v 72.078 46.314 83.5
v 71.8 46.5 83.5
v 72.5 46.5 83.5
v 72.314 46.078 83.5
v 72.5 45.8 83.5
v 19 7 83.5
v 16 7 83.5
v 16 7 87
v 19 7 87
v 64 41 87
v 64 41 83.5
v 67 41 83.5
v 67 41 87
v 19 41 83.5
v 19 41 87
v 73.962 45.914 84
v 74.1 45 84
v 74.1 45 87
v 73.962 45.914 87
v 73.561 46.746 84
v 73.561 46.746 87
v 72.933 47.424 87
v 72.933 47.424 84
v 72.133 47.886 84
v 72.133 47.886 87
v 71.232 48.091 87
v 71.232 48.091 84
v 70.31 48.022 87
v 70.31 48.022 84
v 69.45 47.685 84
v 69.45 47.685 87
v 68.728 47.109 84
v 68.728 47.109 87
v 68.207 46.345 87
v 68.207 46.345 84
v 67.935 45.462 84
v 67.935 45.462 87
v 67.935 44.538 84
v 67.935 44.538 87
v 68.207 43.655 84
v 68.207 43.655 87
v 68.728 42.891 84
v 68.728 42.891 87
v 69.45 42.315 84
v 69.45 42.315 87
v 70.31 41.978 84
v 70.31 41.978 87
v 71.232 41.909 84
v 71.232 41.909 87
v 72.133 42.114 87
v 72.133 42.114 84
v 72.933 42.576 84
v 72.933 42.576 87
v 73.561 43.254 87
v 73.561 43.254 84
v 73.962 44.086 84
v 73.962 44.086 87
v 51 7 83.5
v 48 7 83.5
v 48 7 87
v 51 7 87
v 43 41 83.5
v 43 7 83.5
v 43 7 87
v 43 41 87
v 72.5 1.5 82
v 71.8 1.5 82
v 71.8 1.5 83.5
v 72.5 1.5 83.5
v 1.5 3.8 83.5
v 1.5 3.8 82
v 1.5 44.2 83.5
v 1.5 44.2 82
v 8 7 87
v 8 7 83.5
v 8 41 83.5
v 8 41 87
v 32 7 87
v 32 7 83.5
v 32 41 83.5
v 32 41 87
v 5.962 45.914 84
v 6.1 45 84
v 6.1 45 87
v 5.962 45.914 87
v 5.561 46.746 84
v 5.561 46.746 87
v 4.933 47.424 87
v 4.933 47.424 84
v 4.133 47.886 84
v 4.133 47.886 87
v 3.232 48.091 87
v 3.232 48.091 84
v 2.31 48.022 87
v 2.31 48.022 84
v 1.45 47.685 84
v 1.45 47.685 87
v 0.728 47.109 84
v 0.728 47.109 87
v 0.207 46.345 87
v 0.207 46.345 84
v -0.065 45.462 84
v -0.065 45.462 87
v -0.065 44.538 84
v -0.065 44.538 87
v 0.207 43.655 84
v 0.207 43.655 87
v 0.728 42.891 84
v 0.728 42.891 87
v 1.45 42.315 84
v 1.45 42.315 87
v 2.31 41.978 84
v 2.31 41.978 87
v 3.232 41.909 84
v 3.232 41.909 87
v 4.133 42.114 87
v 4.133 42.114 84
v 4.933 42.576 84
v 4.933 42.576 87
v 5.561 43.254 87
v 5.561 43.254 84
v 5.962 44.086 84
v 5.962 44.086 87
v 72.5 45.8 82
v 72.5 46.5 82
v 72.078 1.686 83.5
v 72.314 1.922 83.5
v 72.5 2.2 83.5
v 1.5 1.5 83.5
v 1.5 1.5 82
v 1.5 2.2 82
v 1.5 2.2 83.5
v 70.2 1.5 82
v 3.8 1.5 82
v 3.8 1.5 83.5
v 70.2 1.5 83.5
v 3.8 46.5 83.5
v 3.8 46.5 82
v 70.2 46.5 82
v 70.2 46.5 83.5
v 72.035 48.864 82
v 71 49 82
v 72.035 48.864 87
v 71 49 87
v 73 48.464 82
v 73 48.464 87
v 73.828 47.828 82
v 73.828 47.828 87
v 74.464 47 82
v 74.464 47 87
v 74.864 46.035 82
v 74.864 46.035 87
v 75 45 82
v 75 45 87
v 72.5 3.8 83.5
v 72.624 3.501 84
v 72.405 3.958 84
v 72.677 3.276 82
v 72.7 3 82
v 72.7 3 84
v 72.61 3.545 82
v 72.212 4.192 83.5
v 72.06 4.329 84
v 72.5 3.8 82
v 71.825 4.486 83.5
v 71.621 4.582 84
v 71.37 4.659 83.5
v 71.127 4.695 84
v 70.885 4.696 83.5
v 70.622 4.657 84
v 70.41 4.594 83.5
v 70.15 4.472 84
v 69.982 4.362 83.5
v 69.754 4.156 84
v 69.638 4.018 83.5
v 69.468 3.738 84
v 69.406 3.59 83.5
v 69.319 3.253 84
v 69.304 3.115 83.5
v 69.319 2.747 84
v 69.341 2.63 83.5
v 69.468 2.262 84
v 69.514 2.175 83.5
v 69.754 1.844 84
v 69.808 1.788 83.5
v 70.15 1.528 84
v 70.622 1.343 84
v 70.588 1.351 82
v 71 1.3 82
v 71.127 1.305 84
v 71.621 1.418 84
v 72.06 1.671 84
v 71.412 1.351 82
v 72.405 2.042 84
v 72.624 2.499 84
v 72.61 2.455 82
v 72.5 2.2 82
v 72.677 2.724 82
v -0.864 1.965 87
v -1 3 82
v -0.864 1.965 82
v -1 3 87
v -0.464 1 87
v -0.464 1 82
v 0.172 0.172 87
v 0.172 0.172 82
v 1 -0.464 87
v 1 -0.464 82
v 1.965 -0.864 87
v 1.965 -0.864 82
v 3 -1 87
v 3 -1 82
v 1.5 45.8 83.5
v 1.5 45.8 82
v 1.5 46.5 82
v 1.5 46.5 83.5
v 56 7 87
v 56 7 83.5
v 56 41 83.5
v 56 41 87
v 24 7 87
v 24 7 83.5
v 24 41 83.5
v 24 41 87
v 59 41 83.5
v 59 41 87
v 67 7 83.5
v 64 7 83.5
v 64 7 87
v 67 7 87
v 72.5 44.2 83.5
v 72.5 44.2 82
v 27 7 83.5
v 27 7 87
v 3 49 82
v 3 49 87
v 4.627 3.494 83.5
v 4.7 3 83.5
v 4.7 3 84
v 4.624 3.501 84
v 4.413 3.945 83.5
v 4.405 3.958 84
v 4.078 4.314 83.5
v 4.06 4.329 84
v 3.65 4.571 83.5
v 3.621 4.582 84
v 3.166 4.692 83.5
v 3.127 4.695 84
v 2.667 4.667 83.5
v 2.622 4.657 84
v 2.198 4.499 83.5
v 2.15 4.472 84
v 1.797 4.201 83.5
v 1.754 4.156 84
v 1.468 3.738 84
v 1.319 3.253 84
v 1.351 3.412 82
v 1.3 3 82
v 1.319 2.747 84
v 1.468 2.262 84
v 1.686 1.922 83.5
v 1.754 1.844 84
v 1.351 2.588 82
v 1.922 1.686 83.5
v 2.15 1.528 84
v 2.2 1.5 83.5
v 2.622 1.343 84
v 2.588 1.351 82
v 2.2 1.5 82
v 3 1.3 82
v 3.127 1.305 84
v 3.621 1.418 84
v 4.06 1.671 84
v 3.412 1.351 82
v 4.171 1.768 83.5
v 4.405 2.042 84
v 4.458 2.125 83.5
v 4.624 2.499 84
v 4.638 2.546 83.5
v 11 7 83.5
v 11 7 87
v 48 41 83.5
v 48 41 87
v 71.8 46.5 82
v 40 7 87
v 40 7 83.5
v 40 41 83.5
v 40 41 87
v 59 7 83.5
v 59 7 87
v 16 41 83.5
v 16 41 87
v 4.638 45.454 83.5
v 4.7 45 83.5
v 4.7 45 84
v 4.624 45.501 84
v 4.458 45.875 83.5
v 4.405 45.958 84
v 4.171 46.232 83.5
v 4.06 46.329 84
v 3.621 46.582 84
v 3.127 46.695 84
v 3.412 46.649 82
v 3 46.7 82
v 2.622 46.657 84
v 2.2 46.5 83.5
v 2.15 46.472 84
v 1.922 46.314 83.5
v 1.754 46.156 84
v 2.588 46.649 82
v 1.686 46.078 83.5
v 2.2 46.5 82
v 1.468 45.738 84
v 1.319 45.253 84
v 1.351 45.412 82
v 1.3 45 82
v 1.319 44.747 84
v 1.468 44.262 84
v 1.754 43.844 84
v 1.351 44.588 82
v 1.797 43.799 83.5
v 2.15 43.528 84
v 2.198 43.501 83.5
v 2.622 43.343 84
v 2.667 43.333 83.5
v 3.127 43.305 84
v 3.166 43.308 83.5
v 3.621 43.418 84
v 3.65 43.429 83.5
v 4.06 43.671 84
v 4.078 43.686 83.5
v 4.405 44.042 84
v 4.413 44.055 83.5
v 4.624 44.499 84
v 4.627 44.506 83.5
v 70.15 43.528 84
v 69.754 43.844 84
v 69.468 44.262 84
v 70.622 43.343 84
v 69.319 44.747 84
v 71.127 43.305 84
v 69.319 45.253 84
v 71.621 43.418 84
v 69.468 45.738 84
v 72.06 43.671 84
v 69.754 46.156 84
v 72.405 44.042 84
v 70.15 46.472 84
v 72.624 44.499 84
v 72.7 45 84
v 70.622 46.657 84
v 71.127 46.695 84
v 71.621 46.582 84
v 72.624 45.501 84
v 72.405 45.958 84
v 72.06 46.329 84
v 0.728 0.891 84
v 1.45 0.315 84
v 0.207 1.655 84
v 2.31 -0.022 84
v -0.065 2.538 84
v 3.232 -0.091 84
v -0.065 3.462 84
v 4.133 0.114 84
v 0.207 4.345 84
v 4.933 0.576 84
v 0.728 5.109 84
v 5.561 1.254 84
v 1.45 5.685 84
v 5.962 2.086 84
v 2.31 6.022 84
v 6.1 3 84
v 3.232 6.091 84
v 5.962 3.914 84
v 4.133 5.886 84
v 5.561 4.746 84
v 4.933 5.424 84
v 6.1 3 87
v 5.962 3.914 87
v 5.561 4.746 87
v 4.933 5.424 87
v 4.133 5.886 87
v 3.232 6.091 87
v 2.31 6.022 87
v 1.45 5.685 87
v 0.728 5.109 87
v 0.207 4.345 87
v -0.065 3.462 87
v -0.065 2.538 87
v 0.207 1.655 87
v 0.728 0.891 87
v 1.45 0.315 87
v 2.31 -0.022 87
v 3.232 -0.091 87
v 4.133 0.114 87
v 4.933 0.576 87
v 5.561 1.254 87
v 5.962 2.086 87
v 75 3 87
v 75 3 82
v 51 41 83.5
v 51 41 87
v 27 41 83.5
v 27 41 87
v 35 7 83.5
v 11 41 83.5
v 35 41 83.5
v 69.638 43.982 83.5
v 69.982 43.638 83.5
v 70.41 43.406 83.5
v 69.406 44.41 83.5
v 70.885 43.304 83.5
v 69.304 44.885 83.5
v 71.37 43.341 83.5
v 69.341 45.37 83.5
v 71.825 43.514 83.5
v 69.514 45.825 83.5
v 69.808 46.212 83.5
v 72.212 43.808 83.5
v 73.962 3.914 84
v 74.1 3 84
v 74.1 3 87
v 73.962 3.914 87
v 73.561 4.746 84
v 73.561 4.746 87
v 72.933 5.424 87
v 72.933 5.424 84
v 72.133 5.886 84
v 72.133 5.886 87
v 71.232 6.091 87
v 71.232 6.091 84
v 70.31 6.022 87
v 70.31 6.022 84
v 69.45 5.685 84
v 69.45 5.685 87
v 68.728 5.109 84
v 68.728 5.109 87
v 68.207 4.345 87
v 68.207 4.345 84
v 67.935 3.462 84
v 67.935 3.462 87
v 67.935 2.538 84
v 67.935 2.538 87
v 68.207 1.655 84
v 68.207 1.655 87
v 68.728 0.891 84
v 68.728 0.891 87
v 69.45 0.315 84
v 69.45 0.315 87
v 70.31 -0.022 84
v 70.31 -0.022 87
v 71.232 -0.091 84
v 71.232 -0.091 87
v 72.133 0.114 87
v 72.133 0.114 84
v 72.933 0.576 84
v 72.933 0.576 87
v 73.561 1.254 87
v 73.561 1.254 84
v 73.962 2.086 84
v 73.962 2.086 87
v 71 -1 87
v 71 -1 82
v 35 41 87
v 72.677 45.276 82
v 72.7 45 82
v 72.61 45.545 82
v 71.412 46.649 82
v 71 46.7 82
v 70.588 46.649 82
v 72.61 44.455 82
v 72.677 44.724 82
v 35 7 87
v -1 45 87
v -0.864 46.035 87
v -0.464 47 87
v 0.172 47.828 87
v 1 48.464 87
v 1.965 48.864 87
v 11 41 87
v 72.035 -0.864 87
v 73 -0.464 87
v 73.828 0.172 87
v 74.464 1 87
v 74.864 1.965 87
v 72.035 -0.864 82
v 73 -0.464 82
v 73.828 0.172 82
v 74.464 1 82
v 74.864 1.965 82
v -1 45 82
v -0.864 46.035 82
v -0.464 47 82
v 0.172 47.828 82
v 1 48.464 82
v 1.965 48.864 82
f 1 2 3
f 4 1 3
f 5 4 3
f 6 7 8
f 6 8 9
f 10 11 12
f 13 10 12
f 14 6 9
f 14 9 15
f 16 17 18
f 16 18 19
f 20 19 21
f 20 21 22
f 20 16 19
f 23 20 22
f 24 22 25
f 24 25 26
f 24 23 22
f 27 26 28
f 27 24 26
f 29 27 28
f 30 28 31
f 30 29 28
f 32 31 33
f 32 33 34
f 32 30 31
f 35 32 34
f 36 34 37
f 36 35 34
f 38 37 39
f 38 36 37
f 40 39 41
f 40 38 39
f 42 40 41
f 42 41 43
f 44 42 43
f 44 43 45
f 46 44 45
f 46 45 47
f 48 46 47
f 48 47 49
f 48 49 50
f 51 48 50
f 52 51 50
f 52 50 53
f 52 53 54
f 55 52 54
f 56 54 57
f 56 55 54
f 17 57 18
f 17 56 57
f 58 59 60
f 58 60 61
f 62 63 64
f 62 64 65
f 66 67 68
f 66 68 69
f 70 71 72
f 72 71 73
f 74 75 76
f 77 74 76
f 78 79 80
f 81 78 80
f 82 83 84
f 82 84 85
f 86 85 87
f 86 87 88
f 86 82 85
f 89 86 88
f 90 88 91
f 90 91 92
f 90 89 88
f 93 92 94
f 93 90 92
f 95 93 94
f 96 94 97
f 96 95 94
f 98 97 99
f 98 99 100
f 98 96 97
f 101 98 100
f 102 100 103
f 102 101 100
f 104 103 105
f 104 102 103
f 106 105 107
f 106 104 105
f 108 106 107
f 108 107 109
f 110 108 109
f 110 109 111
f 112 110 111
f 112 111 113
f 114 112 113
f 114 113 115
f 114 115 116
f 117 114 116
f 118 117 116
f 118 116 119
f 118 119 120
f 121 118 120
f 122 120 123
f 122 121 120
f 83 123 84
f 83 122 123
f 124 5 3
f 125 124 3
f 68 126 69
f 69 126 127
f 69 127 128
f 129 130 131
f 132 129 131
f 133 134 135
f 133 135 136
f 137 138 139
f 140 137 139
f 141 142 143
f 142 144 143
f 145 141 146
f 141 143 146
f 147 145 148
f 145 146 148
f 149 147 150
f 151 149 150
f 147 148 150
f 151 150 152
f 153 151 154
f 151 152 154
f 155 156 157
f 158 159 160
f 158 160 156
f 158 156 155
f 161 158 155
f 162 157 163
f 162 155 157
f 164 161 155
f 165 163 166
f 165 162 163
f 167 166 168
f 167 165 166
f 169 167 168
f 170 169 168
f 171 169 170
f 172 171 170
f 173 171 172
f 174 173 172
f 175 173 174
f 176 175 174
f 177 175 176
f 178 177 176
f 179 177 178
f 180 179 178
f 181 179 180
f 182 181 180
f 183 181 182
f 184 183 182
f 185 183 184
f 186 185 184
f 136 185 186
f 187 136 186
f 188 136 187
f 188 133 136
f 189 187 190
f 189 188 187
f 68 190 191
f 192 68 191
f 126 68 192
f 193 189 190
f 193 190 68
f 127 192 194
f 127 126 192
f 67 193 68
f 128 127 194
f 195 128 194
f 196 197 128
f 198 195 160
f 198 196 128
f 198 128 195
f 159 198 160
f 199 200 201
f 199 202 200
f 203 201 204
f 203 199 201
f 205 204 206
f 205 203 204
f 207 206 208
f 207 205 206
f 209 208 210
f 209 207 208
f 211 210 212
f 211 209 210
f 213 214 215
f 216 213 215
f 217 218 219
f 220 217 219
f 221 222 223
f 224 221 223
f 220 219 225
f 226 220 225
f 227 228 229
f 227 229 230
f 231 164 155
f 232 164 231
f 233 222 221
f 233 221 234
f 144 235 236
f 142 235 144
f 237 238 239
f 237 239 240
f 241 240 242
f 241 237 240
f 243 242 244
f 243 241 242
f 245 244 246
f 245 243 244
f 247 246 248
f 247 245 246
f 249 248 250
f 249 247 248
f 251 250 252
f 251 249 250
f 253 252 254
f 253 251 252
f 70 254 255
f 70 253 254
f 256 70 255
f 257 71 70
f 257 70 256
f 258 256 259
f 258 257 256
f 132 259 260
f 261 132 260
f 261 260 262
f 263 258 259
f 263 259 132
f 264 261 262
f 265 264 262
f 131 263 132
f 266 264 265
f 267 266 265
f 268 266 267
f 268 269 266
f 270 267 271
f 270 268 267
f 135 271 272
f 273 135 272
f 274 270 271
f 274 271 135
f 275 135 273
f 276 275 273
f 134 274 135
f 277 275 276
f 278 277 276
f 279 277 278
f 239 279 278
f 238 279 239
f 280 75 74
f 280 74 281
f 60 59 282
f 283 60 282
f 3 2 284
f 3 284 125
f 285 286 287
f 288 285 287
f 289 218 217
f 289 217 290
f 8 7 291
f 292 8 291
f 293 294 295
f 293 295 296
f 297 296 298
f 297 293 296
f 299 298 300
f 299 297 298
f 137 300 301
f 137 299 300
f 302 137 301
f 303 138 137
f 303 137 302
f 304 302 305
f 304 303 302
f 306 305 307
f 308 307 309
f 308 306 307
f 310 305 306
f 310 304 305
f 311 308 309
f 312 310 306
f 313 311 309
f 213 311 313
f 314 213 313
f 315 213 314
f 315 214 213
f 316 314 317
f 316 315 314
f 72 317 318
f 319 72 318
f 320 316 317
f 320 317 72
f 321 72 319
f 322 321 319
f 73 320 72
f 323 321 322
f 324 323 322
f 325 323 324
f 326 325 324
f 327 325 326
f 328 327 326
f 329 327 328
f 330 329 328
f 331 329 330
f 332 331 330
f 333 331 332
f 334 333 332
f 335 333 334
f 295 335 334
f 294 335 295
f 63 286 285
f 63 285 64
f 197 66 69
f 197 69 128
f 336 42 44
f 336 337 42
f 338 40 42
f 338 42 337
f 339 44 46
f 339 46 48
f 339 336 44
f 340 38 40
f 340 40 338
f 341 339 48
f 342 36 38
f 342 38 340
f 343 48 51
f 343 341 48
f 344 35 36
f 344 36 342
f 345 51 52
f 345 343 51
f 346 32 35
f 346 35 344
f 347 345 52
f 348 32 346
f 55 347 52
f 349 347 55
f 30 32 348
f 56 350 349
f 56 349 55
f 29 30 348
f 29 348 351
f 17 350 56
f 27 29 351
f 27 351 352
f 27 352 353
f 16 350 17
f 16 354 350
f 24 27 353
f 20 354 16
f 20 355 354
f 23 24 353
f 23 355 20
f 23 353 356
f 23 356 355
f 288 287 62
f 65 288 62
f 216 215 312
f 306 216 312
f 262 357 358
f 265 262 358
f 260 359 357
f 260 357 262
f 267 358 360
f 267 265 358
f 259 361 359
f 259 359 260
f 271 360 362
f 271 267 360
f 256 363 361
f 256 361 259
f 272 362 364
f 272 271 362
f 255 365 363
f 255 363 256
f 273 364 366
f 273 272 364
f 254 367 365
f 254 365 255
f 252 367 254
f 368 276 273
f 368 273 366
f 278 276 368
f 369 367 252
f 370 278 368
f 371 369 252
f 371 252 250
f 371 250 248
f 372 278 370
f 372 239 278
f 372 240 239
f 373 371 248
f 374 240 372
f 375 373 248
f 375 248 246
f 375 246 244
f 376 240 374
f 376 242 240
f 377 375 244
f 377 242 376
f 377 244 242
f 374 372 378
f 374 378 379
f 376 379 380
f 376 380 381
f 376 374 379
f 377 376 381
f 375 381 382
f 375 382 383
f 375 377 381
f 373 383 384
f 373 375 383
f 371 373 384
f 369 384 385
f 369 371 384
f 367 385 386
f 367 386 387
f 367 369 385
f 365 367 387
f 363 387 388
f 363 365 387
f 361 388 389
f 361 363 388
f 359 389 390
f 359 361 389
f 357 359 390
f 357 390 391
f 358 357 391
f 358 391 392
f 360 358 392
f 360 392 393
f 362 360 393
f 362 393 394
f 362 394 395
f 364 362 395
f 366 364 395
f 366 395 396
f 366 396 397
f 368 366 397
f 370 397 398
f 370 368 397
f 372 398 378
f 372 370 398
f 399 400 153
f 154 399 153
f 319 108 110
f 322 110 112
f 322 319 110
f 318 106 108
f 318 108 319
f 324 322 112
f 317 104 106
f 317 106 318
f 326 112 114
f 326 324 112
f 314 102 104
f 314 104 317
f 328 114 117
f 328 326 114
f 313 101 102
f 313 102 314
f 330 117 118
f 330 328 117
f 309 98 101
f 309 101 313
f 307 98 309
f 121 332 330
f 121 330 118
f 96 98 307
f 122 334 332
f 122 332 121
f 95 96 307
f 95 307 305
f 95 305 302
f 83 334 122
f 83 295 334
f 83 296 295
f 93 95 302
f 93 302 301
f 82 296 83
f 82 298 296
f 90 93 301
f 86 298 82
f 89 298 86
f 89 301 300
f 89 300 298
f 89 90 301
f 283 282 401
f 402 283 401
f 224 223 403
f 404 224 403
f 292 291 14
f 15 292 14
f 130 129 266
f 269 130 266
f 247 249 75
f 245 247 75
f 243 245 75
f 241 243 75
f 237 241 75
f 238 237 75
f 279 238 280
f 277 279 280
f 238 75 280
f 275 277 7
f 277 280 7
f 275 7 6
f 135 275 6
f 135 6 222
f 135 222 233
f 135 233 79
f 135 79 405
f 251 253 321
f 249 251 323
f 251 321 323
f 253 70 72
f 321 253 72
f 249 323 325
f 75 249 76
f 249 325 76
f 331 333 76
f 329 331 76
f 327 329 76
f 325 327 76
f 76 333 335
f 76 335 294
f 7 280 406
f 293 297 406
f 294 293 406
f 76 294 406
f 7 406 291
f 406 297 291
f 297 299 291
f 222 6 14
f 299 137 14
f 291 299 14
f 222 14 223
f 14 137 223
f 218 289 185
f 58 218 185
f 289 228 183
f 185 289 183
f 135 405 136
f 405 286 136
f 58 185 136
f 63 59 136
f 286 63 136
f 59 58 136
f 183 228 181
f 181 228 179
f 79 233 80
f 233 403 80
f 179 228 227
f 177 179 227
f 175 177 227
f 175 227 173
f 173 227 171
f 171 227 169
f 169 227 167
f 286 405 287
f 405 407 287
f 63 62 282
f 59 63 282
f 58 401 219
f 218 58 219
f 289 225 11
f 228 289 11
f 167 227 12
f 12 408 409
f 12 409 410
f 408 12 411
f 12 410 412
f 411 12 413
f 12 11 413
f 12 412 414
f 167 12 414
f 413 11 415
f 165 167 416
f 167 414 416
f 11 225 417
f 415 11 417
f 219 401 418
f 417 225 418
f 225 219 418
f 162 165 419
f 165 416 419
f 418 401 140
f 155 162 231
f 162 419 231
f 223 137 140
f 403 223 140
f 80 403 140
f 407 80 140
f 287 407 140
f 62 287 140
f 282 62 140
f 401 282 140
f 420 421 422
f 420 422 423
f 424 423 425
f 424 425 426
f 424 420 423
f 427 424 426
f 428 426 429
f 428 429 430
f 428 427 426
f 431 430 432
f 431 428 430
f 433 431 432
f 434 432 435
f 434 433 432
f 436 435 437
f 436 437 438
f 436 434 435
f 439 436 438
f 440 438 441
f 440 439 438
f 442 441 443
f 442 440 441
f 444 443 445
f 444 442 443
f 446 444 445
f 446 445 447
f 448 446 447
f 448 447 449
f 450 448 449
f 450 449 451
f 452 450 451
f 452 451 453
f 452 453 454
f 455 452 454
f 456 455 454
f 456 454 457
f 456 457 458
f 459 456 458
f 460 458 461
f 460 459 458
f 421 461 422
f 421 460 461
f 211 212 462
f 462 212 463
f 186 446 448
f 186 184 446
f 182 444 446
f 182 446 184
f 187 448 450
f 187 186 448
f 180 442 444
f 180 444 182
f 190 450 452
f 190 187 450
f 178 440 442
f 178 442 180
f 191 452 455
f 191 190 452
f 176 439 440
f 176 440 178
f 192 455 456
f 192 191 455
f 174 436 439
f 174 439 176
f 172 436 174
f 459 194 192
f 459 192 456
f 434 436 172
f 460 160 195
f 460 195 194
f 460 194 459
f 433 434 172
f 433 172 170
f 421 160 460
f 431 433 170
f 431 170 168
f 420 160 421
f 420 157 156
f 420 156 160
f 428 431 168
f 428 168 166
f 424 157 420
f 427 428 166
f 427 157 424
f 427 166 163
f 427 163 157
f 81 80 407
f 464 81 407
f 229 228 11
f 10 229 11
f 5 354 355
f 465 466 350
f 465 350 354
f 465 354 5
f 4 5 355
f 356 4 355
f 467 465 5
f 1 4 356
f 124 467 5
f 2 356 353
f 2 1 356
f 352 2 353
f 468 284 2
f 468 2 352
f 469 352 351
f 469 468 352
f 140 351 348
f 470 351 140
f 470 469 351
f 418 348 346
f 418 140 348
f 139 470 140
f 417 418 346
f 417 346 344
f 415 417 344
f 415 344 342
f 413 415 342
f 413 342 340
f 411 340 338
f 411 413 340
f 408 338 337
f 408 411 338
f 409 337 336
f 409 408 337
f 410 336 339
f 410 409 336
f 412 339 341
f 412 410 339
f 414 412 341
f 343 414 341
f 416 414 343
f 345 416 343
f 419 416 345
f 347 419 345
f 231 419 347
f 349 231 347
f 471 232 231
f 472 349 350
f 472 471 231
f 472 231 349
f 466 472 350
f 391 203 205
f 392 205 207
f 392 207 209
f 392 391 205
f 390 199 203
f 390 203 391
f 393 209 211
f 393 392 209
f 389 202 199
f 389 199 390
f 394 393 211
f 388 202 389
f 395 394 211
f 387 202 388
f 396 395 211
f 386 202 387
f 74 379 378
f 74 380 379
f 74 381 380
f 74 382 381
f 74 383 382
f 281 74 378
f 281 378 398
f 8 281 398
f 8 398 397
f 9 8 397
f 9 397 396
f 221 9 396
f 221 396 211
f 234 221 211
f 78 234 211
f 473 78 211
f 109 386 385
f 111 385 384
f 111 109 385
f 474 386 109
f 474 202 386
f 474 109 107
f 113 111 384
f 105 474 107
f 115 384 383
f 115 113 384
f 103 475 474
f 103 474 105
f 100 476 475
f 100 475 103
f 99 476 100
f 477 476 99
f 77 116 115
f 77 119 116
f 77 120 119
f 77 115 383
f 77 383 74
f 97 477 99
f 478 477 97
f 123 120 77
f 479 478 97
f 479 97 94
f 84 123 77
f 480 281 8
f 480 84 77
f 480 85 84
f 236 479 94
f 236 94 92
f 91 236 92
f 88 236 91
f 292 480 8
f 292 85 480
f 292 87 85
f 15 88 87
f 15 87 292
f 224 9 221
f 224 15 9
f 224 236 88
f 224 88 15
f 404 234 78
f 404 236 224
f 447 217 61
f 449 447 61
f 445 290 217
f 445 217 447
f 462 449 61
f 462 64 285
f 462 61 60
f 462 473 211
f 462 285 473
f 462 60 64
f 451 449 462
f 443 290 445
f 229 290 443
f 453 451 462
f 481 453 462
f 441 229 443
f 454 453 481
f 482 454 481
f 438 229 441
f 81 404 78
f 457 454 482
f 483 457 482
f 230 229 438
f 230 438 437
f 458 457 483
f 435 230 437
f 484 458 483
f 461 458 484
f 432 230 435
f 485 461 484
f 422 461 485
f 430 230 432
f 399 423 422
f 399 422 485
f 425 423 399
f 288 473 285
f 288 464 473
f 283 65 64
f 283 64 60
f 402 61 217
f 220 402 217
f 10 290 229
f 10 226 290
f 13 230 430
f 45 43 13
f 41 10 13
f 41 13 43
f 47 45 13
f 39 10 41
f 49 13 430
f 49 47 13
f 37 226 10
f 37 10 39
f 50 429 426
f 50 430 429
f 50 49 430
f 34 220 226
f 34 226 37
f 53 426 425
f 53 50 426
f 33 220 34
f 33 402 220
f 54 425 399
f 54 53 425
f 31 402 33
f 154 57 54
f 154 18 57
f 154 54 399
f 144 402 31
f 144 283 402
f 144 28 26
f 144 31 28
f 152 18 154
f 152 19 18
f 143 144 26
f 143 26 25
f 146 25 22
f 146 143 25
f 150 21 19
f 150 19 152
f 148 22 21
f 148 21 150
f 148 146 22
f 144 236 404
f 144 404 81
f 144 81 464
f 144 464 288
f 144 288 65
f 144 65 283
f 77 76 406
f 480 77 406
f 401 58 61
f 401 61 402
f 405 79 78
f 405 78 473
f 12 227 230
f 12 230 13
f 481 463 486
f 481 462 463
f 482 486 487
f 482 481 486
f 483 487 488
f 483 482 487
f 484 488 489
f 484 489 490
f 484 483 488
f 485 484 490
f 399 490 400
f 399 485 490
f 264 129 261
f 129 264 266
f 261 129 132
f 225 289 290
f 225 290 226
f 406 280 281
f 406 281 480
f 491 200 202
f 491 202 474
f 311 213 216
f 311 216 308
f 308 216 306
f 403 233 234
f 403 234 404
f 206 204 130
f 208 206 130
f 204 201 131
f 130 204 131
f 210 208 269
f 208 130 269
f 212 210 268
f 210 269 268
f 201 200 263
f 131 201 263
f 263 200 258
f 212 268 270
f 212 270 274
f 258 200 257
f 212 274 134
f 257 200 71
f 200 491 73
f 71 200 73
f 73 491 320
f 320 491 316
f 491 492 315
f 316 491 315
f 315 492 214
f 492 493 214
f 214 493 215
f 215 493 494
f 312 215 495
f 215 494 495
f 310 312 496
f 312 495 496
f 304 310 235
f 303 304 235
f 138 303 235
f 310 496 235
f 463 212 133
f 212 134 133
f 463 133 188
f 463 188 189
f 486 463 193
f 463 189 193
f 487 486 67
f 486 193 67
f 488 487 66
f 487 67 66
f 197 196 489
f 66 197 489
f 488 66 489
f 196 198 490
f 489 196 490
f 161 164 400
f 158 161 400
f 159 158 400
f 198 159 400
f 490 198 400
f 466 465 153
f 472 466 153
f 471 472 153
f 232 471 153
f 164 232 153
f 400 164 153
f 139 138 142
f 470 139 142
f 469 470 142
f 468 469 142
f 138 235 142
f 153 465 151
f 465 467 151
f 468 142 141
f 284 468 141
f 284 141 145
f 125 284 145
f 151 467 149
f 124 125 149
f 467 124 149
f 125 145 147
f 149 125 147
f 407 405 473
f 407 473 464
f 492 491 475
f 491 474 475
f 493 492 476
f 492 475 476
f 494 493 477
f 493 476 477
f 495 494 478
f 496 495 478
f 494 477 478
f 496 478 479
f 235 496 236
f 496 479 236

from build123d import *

# Parameters (mm, degrees)
BOX010_W          = 3
BOX010_H          = 34
BOX010_DEPTH      = 15
BOX016_W          = 3
BOX016_H          = 34
BOX016_DEPTH      = 15
BOX013_W          = 3
BOX013_H          = 34
BOX013_DEPTH      = 15
BOX015_W          = 3
BOX015_H          = 34
BOX015_DEPTH      = 15
BOX012_W          = 3
BOX012_H          = 34
BOX012_DEPTH      = 15
BOX014_W          = 3
BOX014_H          = 34
BOX014_DEPTH      = 15
BOX011_W          = 3
BOX011_H          = 34
BOX011_DEPTH      = 15
BOX009_W          = 3
BOX009_H          = 34
BOX009_DEPTH      = 15
CYLINDER015_R     = 3.1
CYLINDER015_DEPTH = 3
CYLINDER017_R     = 3.1
CYLINDER017_DEPTH = 3
CYLINDER016_R     = 3.1
CYLINDER016_DEPTH = 3
CYLINDER014_R     = 3.1
CYLINDER014_DEPTH = 3
CYLINDER010_R     = 1.7
CYLINDER010_DEPTH = 10
CYLINDER013_R     = 1.7
CYLINDER013_DEPTH = 10
CYLINDER011_R     = 1.7
CYLINDER011_DEPTH = 10
CYLINDER012_R     = 1.7
CYLINDER012_DEPTH = 10
BOX008_W          = 71
BOX008_H          = 45
BOX008_DEPTH      = 5
BOX007_W          = 76
BOX007_H          = 50
BOX007_DEPTH      = 5
FILLET006_R       = 4


with BuildPart() as cubo001:
    # Box010 → Box010 (new body)
    with BuildSketch(Plane(origin=(16, 7, 46), x_dir=(1, 0, 0), z_dir=(0, 0, 1))):
        with Locations((1.5, 17)):
            Rectangle(BOX010_W, BOX010_H)
    extrude(amount=BOX010_DEPTH)


with BuildPart() as cubo007:
    # Box016 → Box016 (new body)
    with BuildSketch(Plane(origin=(64, 7, 46), x_dir=(1, 0, 0), z_dir=(0, 0, 1))):
        with Locations((1.5, 17)):
            Rectangle(BOX016_W, BOX016_H)
    extrude(amount=BOX016_DEPTH)


with BuildPart() as cubo004:
    # Box013 → Box013 (new body)
    with BuildSketch(Plane(origin=(40, 7, 46), x_dir=(1, 0, 0), z_dir=(0, 0, 1))):
        with Locations((1.5, 17)):
            Rectangle(BOX013_W, BOX013_H)
    extrude(amount=BOX013_DEPTH)


with BuildPart() as cubo006:
    # Box015 → Box015 (new body)
    with BuildSketch(Plane(origin=(56, 7, 46), x_dir=(1, 0, 0), z_dir=(0, 0, 1))):
        with Locations((1.5, 17)):
            Rectangle(BOX015_W, BOX015_H)
    extrude(amount=BOX015_DEPTH)


with BuildPart() as cubo003:
    # Box012 → Box012 (new body)
    with BuildSketch(Plane(origin=(32, 7, 46), x_dir=(1, 0, 0), z_dir=(0, 0, 1))):
        with Locations((1.5, 17)):
            Rectangle(BOX012_W, BOX012_H)
    extrude(amount=BOX012_DEPTH)


with BuildPart() as cubo005:
    # Box014 → Box014 (new body)
    with BuildSketch(Plane(origin=(48, 7, 46), x_dir=(1, 0, 0), z_dir=(0, 0, 1))):
        with Locations((1.5, 17)):
            Rectangle(BOX014_W, BOX014_H)
    extrude(amount=BOX014_DEPTH)


with BuildPart() as cubo002:
    # Box011 → Box011 (new body)
    with BuildSketch(Plane(origin=(24, 7, 46), x_dir=(1, 0, 0), z_dir=(0, 0, 1))):
        with Locations((1.5, 17)):
            Rectangle(BOX011_W, BOX011_H)
    extrude(amount=BOX011_DEPTH)


with BuildPart() as fusion006:
    # Box009 → Box009 (new body)
    with BuildSketch(Plane(origin=(8, 7, 46), x_dir=(1, 0, 0), z_dir=(0, 0, 1))):
        with Locations((1.5, 17)):
            Rectangle(BOX009_W, BOX009_H)
    extrude(amount=BOX009_DEPTH)

    # Fusion006: union Cubo001, Cubo007, Cubo004, Cubo006, Cubo003, Cubo005, Cubo002
    add(cubo001.part)
    add(cubo007.part)
    add(cubo004.part)
    add(cubo006.part)
    add(cubo003.part)
    add(cubo005.part)
    add(cubo002.part)


with BuildPart() as orificio_tornillo009:
    # Cylinder015 → Cylinder015 (new body)
    with BuildSketch(Plane(origin=(71, 3, 40), x_dir=(1, 0, 0), z_dir=(0, 0, 1))):
        Circle(CYLINDER015_R)
    extrude(amount=CYLINDER015_DEPTH)


with BuildPart() as orificio_tornillo011:
    # Cylinder017 → Cylinder017 (new body)
    with BuildSketch(Plane(origin=(3, 45, 40), x_dir=(1, 0, 0), z_dir=(0, 0, 1))):
        Circle(CYLINDER017_R)
    extrude(amount=CYLINDER017_DEPTH)


with BuildPart() as orificio_tornillo010:
    # Cylinder016 → Cylinder016 (new body)
    with BuildSketch(Plane(origin=(71, 45, 40), x_dir=(1, 0, 0), z_dir=(0, 0, 1))):
        Circle(CYLINDER016_R)
    extrude(amount=CYLINDER016_DEPTH)


with BuildPart() as orificions_cabezas_superior:
    # Cylinder014 → Cylinder014 (new body)
    with BuildSketch(Plane(origin=(3, 3, 40), x_dir=(1, 0, 0), z_dir=(0, 0, 1))):
        Circle(CYLINDER014_R)
    extrude(amount=CYLINDER014_DEPTH)

    # Fusion005: union orificio tornillo009, orificio tornillo011, orificio tornillo010
    add(orificio_tornillo009.part)
    add(orificio_tornillo011.part)
    add(orificio_tornillo010.part)


with BuildPart() as orificions_cabezas_superior_1:
    # Fusion005 placement: moved
    add(orificions_cabezas_superior.part.moved(Location((0, 0, 12))))


with BuildPart() as orificio_tornillo004:
    # Cylinder010 → Cylinder010 (new body)
    with BuildSketch(Plane(origin=(71, 3, 40), x_dir=(1, 0, 0), z_dir=(0, 0, 1))):
        Circle(CYLINDER010_R)
    extrude(amount=CYLINDER010_DEPTH)


with BuildPart() as orificio_tornillo007:
    # Cylinder013 → Cylinder013 (new body)
    with BuildSketch(Plane(origin=(3, 45, 40), x_dir=(1, 0, 0), z_dir=(0, 0, 1))):
        Circle(CYLINDER013_R)
    extrude(amount=CYLINDER013_DEPTH)


with BuildPart() as orificio_tornillo005:
    # Cylinder011 → Cylinder011 (new body)
    with BuildSketch(Plane(origin=(71, 45, 40), x_dir=(1, 0, 0), z_dir=(0, 0, 1))):
        Circle(CYLINDER011_R)
    extrude(amount=CYLINDER011_DEPTH)


with BuildPart() as orificions_tornillos001:
    # Cylinder012 → Cylinder012 (new body)
    with BuildSketch(Plane(origin=(3, 3, 40), x_dir=(1, 0, 0), z_dir=(0, 0, 1))):
        Circle(CYLINDER012_R)
    extrude(amount=CYLINDER012_DEPTH)

    # Fusion004: union orificio tornillo004, orificio tornillo007, orificio tornillo005
    add(orificio_tornillo004.part)
    add(orificio_tornillo007.part)
    add(orificio_tornillo005.part)


with BuildPart() as orificions_tornillos001_1:
    # Fusion004 placement: moved
    add(orificions_tornillos001.part.moved(Location((0, 0, 6))))


with BuildPart() as vaciado_interior001:
    # Box008 → Box008 (new body)
    with BuildSketch(Plane(origin=(1.5, 1.5, 46.5), x_dir=(1, 0, 0), z_dir=(0, 0, 1))):
        with Locations((35.5, 22.5)):
            Rectangle(BOX008_W, BOX008_H)
    extrude(amount=BOX008_DEPTH)


with BuildPart() as tapa_superior_completa:
    # Box007 → Box007 (new body)
    with BuildSketch(Plane(origin=(-1, -1, 50), x_dir=(1, 0, 0), z_dir=(0, 0, 1))):
        with Locations((38, 25)):
            Rectangle(BOX007_W, BOX007_H)
    extrude(amount=BOX007_DEPTH)

    # Cut006: cut vaciado interior001
    add(vaciado_interior001.part, mode=Mode.SUBTRACT)

    # Fillet006
    fillet006_edges = [tapa_superior_completa.edges().sort_by_distance(p)[0] for p in [
        (-1, -1, 52.5),
        (-1, 49, 52.5),
        (75, -1, 52.5),
        (75, 49, 52.5),
    ]]
    fillet(fillet006_edges, radius=FILLET006_R)

    # Cut007: cut orificions tornillos001
    add(orificions_tornillos001_1.part, mode=Mode.SUBTRACT)

    # Cut008: cut orificions cabezas superior
    add(orificions_cabezas_superior_1.part, mode=Mode.SUBTRACT)

    # Cut009: cut Fusion006
    add(fusion006.part, mode=Mode.SUBTRACT)


with BuildPart() as tapa_superior_completa_1:
    # Cut009 placement: moved
    add(tapa_superior_completa.part.moved(Location((0, 0, 32))))


solid = tapa_superior_completa_1.part
